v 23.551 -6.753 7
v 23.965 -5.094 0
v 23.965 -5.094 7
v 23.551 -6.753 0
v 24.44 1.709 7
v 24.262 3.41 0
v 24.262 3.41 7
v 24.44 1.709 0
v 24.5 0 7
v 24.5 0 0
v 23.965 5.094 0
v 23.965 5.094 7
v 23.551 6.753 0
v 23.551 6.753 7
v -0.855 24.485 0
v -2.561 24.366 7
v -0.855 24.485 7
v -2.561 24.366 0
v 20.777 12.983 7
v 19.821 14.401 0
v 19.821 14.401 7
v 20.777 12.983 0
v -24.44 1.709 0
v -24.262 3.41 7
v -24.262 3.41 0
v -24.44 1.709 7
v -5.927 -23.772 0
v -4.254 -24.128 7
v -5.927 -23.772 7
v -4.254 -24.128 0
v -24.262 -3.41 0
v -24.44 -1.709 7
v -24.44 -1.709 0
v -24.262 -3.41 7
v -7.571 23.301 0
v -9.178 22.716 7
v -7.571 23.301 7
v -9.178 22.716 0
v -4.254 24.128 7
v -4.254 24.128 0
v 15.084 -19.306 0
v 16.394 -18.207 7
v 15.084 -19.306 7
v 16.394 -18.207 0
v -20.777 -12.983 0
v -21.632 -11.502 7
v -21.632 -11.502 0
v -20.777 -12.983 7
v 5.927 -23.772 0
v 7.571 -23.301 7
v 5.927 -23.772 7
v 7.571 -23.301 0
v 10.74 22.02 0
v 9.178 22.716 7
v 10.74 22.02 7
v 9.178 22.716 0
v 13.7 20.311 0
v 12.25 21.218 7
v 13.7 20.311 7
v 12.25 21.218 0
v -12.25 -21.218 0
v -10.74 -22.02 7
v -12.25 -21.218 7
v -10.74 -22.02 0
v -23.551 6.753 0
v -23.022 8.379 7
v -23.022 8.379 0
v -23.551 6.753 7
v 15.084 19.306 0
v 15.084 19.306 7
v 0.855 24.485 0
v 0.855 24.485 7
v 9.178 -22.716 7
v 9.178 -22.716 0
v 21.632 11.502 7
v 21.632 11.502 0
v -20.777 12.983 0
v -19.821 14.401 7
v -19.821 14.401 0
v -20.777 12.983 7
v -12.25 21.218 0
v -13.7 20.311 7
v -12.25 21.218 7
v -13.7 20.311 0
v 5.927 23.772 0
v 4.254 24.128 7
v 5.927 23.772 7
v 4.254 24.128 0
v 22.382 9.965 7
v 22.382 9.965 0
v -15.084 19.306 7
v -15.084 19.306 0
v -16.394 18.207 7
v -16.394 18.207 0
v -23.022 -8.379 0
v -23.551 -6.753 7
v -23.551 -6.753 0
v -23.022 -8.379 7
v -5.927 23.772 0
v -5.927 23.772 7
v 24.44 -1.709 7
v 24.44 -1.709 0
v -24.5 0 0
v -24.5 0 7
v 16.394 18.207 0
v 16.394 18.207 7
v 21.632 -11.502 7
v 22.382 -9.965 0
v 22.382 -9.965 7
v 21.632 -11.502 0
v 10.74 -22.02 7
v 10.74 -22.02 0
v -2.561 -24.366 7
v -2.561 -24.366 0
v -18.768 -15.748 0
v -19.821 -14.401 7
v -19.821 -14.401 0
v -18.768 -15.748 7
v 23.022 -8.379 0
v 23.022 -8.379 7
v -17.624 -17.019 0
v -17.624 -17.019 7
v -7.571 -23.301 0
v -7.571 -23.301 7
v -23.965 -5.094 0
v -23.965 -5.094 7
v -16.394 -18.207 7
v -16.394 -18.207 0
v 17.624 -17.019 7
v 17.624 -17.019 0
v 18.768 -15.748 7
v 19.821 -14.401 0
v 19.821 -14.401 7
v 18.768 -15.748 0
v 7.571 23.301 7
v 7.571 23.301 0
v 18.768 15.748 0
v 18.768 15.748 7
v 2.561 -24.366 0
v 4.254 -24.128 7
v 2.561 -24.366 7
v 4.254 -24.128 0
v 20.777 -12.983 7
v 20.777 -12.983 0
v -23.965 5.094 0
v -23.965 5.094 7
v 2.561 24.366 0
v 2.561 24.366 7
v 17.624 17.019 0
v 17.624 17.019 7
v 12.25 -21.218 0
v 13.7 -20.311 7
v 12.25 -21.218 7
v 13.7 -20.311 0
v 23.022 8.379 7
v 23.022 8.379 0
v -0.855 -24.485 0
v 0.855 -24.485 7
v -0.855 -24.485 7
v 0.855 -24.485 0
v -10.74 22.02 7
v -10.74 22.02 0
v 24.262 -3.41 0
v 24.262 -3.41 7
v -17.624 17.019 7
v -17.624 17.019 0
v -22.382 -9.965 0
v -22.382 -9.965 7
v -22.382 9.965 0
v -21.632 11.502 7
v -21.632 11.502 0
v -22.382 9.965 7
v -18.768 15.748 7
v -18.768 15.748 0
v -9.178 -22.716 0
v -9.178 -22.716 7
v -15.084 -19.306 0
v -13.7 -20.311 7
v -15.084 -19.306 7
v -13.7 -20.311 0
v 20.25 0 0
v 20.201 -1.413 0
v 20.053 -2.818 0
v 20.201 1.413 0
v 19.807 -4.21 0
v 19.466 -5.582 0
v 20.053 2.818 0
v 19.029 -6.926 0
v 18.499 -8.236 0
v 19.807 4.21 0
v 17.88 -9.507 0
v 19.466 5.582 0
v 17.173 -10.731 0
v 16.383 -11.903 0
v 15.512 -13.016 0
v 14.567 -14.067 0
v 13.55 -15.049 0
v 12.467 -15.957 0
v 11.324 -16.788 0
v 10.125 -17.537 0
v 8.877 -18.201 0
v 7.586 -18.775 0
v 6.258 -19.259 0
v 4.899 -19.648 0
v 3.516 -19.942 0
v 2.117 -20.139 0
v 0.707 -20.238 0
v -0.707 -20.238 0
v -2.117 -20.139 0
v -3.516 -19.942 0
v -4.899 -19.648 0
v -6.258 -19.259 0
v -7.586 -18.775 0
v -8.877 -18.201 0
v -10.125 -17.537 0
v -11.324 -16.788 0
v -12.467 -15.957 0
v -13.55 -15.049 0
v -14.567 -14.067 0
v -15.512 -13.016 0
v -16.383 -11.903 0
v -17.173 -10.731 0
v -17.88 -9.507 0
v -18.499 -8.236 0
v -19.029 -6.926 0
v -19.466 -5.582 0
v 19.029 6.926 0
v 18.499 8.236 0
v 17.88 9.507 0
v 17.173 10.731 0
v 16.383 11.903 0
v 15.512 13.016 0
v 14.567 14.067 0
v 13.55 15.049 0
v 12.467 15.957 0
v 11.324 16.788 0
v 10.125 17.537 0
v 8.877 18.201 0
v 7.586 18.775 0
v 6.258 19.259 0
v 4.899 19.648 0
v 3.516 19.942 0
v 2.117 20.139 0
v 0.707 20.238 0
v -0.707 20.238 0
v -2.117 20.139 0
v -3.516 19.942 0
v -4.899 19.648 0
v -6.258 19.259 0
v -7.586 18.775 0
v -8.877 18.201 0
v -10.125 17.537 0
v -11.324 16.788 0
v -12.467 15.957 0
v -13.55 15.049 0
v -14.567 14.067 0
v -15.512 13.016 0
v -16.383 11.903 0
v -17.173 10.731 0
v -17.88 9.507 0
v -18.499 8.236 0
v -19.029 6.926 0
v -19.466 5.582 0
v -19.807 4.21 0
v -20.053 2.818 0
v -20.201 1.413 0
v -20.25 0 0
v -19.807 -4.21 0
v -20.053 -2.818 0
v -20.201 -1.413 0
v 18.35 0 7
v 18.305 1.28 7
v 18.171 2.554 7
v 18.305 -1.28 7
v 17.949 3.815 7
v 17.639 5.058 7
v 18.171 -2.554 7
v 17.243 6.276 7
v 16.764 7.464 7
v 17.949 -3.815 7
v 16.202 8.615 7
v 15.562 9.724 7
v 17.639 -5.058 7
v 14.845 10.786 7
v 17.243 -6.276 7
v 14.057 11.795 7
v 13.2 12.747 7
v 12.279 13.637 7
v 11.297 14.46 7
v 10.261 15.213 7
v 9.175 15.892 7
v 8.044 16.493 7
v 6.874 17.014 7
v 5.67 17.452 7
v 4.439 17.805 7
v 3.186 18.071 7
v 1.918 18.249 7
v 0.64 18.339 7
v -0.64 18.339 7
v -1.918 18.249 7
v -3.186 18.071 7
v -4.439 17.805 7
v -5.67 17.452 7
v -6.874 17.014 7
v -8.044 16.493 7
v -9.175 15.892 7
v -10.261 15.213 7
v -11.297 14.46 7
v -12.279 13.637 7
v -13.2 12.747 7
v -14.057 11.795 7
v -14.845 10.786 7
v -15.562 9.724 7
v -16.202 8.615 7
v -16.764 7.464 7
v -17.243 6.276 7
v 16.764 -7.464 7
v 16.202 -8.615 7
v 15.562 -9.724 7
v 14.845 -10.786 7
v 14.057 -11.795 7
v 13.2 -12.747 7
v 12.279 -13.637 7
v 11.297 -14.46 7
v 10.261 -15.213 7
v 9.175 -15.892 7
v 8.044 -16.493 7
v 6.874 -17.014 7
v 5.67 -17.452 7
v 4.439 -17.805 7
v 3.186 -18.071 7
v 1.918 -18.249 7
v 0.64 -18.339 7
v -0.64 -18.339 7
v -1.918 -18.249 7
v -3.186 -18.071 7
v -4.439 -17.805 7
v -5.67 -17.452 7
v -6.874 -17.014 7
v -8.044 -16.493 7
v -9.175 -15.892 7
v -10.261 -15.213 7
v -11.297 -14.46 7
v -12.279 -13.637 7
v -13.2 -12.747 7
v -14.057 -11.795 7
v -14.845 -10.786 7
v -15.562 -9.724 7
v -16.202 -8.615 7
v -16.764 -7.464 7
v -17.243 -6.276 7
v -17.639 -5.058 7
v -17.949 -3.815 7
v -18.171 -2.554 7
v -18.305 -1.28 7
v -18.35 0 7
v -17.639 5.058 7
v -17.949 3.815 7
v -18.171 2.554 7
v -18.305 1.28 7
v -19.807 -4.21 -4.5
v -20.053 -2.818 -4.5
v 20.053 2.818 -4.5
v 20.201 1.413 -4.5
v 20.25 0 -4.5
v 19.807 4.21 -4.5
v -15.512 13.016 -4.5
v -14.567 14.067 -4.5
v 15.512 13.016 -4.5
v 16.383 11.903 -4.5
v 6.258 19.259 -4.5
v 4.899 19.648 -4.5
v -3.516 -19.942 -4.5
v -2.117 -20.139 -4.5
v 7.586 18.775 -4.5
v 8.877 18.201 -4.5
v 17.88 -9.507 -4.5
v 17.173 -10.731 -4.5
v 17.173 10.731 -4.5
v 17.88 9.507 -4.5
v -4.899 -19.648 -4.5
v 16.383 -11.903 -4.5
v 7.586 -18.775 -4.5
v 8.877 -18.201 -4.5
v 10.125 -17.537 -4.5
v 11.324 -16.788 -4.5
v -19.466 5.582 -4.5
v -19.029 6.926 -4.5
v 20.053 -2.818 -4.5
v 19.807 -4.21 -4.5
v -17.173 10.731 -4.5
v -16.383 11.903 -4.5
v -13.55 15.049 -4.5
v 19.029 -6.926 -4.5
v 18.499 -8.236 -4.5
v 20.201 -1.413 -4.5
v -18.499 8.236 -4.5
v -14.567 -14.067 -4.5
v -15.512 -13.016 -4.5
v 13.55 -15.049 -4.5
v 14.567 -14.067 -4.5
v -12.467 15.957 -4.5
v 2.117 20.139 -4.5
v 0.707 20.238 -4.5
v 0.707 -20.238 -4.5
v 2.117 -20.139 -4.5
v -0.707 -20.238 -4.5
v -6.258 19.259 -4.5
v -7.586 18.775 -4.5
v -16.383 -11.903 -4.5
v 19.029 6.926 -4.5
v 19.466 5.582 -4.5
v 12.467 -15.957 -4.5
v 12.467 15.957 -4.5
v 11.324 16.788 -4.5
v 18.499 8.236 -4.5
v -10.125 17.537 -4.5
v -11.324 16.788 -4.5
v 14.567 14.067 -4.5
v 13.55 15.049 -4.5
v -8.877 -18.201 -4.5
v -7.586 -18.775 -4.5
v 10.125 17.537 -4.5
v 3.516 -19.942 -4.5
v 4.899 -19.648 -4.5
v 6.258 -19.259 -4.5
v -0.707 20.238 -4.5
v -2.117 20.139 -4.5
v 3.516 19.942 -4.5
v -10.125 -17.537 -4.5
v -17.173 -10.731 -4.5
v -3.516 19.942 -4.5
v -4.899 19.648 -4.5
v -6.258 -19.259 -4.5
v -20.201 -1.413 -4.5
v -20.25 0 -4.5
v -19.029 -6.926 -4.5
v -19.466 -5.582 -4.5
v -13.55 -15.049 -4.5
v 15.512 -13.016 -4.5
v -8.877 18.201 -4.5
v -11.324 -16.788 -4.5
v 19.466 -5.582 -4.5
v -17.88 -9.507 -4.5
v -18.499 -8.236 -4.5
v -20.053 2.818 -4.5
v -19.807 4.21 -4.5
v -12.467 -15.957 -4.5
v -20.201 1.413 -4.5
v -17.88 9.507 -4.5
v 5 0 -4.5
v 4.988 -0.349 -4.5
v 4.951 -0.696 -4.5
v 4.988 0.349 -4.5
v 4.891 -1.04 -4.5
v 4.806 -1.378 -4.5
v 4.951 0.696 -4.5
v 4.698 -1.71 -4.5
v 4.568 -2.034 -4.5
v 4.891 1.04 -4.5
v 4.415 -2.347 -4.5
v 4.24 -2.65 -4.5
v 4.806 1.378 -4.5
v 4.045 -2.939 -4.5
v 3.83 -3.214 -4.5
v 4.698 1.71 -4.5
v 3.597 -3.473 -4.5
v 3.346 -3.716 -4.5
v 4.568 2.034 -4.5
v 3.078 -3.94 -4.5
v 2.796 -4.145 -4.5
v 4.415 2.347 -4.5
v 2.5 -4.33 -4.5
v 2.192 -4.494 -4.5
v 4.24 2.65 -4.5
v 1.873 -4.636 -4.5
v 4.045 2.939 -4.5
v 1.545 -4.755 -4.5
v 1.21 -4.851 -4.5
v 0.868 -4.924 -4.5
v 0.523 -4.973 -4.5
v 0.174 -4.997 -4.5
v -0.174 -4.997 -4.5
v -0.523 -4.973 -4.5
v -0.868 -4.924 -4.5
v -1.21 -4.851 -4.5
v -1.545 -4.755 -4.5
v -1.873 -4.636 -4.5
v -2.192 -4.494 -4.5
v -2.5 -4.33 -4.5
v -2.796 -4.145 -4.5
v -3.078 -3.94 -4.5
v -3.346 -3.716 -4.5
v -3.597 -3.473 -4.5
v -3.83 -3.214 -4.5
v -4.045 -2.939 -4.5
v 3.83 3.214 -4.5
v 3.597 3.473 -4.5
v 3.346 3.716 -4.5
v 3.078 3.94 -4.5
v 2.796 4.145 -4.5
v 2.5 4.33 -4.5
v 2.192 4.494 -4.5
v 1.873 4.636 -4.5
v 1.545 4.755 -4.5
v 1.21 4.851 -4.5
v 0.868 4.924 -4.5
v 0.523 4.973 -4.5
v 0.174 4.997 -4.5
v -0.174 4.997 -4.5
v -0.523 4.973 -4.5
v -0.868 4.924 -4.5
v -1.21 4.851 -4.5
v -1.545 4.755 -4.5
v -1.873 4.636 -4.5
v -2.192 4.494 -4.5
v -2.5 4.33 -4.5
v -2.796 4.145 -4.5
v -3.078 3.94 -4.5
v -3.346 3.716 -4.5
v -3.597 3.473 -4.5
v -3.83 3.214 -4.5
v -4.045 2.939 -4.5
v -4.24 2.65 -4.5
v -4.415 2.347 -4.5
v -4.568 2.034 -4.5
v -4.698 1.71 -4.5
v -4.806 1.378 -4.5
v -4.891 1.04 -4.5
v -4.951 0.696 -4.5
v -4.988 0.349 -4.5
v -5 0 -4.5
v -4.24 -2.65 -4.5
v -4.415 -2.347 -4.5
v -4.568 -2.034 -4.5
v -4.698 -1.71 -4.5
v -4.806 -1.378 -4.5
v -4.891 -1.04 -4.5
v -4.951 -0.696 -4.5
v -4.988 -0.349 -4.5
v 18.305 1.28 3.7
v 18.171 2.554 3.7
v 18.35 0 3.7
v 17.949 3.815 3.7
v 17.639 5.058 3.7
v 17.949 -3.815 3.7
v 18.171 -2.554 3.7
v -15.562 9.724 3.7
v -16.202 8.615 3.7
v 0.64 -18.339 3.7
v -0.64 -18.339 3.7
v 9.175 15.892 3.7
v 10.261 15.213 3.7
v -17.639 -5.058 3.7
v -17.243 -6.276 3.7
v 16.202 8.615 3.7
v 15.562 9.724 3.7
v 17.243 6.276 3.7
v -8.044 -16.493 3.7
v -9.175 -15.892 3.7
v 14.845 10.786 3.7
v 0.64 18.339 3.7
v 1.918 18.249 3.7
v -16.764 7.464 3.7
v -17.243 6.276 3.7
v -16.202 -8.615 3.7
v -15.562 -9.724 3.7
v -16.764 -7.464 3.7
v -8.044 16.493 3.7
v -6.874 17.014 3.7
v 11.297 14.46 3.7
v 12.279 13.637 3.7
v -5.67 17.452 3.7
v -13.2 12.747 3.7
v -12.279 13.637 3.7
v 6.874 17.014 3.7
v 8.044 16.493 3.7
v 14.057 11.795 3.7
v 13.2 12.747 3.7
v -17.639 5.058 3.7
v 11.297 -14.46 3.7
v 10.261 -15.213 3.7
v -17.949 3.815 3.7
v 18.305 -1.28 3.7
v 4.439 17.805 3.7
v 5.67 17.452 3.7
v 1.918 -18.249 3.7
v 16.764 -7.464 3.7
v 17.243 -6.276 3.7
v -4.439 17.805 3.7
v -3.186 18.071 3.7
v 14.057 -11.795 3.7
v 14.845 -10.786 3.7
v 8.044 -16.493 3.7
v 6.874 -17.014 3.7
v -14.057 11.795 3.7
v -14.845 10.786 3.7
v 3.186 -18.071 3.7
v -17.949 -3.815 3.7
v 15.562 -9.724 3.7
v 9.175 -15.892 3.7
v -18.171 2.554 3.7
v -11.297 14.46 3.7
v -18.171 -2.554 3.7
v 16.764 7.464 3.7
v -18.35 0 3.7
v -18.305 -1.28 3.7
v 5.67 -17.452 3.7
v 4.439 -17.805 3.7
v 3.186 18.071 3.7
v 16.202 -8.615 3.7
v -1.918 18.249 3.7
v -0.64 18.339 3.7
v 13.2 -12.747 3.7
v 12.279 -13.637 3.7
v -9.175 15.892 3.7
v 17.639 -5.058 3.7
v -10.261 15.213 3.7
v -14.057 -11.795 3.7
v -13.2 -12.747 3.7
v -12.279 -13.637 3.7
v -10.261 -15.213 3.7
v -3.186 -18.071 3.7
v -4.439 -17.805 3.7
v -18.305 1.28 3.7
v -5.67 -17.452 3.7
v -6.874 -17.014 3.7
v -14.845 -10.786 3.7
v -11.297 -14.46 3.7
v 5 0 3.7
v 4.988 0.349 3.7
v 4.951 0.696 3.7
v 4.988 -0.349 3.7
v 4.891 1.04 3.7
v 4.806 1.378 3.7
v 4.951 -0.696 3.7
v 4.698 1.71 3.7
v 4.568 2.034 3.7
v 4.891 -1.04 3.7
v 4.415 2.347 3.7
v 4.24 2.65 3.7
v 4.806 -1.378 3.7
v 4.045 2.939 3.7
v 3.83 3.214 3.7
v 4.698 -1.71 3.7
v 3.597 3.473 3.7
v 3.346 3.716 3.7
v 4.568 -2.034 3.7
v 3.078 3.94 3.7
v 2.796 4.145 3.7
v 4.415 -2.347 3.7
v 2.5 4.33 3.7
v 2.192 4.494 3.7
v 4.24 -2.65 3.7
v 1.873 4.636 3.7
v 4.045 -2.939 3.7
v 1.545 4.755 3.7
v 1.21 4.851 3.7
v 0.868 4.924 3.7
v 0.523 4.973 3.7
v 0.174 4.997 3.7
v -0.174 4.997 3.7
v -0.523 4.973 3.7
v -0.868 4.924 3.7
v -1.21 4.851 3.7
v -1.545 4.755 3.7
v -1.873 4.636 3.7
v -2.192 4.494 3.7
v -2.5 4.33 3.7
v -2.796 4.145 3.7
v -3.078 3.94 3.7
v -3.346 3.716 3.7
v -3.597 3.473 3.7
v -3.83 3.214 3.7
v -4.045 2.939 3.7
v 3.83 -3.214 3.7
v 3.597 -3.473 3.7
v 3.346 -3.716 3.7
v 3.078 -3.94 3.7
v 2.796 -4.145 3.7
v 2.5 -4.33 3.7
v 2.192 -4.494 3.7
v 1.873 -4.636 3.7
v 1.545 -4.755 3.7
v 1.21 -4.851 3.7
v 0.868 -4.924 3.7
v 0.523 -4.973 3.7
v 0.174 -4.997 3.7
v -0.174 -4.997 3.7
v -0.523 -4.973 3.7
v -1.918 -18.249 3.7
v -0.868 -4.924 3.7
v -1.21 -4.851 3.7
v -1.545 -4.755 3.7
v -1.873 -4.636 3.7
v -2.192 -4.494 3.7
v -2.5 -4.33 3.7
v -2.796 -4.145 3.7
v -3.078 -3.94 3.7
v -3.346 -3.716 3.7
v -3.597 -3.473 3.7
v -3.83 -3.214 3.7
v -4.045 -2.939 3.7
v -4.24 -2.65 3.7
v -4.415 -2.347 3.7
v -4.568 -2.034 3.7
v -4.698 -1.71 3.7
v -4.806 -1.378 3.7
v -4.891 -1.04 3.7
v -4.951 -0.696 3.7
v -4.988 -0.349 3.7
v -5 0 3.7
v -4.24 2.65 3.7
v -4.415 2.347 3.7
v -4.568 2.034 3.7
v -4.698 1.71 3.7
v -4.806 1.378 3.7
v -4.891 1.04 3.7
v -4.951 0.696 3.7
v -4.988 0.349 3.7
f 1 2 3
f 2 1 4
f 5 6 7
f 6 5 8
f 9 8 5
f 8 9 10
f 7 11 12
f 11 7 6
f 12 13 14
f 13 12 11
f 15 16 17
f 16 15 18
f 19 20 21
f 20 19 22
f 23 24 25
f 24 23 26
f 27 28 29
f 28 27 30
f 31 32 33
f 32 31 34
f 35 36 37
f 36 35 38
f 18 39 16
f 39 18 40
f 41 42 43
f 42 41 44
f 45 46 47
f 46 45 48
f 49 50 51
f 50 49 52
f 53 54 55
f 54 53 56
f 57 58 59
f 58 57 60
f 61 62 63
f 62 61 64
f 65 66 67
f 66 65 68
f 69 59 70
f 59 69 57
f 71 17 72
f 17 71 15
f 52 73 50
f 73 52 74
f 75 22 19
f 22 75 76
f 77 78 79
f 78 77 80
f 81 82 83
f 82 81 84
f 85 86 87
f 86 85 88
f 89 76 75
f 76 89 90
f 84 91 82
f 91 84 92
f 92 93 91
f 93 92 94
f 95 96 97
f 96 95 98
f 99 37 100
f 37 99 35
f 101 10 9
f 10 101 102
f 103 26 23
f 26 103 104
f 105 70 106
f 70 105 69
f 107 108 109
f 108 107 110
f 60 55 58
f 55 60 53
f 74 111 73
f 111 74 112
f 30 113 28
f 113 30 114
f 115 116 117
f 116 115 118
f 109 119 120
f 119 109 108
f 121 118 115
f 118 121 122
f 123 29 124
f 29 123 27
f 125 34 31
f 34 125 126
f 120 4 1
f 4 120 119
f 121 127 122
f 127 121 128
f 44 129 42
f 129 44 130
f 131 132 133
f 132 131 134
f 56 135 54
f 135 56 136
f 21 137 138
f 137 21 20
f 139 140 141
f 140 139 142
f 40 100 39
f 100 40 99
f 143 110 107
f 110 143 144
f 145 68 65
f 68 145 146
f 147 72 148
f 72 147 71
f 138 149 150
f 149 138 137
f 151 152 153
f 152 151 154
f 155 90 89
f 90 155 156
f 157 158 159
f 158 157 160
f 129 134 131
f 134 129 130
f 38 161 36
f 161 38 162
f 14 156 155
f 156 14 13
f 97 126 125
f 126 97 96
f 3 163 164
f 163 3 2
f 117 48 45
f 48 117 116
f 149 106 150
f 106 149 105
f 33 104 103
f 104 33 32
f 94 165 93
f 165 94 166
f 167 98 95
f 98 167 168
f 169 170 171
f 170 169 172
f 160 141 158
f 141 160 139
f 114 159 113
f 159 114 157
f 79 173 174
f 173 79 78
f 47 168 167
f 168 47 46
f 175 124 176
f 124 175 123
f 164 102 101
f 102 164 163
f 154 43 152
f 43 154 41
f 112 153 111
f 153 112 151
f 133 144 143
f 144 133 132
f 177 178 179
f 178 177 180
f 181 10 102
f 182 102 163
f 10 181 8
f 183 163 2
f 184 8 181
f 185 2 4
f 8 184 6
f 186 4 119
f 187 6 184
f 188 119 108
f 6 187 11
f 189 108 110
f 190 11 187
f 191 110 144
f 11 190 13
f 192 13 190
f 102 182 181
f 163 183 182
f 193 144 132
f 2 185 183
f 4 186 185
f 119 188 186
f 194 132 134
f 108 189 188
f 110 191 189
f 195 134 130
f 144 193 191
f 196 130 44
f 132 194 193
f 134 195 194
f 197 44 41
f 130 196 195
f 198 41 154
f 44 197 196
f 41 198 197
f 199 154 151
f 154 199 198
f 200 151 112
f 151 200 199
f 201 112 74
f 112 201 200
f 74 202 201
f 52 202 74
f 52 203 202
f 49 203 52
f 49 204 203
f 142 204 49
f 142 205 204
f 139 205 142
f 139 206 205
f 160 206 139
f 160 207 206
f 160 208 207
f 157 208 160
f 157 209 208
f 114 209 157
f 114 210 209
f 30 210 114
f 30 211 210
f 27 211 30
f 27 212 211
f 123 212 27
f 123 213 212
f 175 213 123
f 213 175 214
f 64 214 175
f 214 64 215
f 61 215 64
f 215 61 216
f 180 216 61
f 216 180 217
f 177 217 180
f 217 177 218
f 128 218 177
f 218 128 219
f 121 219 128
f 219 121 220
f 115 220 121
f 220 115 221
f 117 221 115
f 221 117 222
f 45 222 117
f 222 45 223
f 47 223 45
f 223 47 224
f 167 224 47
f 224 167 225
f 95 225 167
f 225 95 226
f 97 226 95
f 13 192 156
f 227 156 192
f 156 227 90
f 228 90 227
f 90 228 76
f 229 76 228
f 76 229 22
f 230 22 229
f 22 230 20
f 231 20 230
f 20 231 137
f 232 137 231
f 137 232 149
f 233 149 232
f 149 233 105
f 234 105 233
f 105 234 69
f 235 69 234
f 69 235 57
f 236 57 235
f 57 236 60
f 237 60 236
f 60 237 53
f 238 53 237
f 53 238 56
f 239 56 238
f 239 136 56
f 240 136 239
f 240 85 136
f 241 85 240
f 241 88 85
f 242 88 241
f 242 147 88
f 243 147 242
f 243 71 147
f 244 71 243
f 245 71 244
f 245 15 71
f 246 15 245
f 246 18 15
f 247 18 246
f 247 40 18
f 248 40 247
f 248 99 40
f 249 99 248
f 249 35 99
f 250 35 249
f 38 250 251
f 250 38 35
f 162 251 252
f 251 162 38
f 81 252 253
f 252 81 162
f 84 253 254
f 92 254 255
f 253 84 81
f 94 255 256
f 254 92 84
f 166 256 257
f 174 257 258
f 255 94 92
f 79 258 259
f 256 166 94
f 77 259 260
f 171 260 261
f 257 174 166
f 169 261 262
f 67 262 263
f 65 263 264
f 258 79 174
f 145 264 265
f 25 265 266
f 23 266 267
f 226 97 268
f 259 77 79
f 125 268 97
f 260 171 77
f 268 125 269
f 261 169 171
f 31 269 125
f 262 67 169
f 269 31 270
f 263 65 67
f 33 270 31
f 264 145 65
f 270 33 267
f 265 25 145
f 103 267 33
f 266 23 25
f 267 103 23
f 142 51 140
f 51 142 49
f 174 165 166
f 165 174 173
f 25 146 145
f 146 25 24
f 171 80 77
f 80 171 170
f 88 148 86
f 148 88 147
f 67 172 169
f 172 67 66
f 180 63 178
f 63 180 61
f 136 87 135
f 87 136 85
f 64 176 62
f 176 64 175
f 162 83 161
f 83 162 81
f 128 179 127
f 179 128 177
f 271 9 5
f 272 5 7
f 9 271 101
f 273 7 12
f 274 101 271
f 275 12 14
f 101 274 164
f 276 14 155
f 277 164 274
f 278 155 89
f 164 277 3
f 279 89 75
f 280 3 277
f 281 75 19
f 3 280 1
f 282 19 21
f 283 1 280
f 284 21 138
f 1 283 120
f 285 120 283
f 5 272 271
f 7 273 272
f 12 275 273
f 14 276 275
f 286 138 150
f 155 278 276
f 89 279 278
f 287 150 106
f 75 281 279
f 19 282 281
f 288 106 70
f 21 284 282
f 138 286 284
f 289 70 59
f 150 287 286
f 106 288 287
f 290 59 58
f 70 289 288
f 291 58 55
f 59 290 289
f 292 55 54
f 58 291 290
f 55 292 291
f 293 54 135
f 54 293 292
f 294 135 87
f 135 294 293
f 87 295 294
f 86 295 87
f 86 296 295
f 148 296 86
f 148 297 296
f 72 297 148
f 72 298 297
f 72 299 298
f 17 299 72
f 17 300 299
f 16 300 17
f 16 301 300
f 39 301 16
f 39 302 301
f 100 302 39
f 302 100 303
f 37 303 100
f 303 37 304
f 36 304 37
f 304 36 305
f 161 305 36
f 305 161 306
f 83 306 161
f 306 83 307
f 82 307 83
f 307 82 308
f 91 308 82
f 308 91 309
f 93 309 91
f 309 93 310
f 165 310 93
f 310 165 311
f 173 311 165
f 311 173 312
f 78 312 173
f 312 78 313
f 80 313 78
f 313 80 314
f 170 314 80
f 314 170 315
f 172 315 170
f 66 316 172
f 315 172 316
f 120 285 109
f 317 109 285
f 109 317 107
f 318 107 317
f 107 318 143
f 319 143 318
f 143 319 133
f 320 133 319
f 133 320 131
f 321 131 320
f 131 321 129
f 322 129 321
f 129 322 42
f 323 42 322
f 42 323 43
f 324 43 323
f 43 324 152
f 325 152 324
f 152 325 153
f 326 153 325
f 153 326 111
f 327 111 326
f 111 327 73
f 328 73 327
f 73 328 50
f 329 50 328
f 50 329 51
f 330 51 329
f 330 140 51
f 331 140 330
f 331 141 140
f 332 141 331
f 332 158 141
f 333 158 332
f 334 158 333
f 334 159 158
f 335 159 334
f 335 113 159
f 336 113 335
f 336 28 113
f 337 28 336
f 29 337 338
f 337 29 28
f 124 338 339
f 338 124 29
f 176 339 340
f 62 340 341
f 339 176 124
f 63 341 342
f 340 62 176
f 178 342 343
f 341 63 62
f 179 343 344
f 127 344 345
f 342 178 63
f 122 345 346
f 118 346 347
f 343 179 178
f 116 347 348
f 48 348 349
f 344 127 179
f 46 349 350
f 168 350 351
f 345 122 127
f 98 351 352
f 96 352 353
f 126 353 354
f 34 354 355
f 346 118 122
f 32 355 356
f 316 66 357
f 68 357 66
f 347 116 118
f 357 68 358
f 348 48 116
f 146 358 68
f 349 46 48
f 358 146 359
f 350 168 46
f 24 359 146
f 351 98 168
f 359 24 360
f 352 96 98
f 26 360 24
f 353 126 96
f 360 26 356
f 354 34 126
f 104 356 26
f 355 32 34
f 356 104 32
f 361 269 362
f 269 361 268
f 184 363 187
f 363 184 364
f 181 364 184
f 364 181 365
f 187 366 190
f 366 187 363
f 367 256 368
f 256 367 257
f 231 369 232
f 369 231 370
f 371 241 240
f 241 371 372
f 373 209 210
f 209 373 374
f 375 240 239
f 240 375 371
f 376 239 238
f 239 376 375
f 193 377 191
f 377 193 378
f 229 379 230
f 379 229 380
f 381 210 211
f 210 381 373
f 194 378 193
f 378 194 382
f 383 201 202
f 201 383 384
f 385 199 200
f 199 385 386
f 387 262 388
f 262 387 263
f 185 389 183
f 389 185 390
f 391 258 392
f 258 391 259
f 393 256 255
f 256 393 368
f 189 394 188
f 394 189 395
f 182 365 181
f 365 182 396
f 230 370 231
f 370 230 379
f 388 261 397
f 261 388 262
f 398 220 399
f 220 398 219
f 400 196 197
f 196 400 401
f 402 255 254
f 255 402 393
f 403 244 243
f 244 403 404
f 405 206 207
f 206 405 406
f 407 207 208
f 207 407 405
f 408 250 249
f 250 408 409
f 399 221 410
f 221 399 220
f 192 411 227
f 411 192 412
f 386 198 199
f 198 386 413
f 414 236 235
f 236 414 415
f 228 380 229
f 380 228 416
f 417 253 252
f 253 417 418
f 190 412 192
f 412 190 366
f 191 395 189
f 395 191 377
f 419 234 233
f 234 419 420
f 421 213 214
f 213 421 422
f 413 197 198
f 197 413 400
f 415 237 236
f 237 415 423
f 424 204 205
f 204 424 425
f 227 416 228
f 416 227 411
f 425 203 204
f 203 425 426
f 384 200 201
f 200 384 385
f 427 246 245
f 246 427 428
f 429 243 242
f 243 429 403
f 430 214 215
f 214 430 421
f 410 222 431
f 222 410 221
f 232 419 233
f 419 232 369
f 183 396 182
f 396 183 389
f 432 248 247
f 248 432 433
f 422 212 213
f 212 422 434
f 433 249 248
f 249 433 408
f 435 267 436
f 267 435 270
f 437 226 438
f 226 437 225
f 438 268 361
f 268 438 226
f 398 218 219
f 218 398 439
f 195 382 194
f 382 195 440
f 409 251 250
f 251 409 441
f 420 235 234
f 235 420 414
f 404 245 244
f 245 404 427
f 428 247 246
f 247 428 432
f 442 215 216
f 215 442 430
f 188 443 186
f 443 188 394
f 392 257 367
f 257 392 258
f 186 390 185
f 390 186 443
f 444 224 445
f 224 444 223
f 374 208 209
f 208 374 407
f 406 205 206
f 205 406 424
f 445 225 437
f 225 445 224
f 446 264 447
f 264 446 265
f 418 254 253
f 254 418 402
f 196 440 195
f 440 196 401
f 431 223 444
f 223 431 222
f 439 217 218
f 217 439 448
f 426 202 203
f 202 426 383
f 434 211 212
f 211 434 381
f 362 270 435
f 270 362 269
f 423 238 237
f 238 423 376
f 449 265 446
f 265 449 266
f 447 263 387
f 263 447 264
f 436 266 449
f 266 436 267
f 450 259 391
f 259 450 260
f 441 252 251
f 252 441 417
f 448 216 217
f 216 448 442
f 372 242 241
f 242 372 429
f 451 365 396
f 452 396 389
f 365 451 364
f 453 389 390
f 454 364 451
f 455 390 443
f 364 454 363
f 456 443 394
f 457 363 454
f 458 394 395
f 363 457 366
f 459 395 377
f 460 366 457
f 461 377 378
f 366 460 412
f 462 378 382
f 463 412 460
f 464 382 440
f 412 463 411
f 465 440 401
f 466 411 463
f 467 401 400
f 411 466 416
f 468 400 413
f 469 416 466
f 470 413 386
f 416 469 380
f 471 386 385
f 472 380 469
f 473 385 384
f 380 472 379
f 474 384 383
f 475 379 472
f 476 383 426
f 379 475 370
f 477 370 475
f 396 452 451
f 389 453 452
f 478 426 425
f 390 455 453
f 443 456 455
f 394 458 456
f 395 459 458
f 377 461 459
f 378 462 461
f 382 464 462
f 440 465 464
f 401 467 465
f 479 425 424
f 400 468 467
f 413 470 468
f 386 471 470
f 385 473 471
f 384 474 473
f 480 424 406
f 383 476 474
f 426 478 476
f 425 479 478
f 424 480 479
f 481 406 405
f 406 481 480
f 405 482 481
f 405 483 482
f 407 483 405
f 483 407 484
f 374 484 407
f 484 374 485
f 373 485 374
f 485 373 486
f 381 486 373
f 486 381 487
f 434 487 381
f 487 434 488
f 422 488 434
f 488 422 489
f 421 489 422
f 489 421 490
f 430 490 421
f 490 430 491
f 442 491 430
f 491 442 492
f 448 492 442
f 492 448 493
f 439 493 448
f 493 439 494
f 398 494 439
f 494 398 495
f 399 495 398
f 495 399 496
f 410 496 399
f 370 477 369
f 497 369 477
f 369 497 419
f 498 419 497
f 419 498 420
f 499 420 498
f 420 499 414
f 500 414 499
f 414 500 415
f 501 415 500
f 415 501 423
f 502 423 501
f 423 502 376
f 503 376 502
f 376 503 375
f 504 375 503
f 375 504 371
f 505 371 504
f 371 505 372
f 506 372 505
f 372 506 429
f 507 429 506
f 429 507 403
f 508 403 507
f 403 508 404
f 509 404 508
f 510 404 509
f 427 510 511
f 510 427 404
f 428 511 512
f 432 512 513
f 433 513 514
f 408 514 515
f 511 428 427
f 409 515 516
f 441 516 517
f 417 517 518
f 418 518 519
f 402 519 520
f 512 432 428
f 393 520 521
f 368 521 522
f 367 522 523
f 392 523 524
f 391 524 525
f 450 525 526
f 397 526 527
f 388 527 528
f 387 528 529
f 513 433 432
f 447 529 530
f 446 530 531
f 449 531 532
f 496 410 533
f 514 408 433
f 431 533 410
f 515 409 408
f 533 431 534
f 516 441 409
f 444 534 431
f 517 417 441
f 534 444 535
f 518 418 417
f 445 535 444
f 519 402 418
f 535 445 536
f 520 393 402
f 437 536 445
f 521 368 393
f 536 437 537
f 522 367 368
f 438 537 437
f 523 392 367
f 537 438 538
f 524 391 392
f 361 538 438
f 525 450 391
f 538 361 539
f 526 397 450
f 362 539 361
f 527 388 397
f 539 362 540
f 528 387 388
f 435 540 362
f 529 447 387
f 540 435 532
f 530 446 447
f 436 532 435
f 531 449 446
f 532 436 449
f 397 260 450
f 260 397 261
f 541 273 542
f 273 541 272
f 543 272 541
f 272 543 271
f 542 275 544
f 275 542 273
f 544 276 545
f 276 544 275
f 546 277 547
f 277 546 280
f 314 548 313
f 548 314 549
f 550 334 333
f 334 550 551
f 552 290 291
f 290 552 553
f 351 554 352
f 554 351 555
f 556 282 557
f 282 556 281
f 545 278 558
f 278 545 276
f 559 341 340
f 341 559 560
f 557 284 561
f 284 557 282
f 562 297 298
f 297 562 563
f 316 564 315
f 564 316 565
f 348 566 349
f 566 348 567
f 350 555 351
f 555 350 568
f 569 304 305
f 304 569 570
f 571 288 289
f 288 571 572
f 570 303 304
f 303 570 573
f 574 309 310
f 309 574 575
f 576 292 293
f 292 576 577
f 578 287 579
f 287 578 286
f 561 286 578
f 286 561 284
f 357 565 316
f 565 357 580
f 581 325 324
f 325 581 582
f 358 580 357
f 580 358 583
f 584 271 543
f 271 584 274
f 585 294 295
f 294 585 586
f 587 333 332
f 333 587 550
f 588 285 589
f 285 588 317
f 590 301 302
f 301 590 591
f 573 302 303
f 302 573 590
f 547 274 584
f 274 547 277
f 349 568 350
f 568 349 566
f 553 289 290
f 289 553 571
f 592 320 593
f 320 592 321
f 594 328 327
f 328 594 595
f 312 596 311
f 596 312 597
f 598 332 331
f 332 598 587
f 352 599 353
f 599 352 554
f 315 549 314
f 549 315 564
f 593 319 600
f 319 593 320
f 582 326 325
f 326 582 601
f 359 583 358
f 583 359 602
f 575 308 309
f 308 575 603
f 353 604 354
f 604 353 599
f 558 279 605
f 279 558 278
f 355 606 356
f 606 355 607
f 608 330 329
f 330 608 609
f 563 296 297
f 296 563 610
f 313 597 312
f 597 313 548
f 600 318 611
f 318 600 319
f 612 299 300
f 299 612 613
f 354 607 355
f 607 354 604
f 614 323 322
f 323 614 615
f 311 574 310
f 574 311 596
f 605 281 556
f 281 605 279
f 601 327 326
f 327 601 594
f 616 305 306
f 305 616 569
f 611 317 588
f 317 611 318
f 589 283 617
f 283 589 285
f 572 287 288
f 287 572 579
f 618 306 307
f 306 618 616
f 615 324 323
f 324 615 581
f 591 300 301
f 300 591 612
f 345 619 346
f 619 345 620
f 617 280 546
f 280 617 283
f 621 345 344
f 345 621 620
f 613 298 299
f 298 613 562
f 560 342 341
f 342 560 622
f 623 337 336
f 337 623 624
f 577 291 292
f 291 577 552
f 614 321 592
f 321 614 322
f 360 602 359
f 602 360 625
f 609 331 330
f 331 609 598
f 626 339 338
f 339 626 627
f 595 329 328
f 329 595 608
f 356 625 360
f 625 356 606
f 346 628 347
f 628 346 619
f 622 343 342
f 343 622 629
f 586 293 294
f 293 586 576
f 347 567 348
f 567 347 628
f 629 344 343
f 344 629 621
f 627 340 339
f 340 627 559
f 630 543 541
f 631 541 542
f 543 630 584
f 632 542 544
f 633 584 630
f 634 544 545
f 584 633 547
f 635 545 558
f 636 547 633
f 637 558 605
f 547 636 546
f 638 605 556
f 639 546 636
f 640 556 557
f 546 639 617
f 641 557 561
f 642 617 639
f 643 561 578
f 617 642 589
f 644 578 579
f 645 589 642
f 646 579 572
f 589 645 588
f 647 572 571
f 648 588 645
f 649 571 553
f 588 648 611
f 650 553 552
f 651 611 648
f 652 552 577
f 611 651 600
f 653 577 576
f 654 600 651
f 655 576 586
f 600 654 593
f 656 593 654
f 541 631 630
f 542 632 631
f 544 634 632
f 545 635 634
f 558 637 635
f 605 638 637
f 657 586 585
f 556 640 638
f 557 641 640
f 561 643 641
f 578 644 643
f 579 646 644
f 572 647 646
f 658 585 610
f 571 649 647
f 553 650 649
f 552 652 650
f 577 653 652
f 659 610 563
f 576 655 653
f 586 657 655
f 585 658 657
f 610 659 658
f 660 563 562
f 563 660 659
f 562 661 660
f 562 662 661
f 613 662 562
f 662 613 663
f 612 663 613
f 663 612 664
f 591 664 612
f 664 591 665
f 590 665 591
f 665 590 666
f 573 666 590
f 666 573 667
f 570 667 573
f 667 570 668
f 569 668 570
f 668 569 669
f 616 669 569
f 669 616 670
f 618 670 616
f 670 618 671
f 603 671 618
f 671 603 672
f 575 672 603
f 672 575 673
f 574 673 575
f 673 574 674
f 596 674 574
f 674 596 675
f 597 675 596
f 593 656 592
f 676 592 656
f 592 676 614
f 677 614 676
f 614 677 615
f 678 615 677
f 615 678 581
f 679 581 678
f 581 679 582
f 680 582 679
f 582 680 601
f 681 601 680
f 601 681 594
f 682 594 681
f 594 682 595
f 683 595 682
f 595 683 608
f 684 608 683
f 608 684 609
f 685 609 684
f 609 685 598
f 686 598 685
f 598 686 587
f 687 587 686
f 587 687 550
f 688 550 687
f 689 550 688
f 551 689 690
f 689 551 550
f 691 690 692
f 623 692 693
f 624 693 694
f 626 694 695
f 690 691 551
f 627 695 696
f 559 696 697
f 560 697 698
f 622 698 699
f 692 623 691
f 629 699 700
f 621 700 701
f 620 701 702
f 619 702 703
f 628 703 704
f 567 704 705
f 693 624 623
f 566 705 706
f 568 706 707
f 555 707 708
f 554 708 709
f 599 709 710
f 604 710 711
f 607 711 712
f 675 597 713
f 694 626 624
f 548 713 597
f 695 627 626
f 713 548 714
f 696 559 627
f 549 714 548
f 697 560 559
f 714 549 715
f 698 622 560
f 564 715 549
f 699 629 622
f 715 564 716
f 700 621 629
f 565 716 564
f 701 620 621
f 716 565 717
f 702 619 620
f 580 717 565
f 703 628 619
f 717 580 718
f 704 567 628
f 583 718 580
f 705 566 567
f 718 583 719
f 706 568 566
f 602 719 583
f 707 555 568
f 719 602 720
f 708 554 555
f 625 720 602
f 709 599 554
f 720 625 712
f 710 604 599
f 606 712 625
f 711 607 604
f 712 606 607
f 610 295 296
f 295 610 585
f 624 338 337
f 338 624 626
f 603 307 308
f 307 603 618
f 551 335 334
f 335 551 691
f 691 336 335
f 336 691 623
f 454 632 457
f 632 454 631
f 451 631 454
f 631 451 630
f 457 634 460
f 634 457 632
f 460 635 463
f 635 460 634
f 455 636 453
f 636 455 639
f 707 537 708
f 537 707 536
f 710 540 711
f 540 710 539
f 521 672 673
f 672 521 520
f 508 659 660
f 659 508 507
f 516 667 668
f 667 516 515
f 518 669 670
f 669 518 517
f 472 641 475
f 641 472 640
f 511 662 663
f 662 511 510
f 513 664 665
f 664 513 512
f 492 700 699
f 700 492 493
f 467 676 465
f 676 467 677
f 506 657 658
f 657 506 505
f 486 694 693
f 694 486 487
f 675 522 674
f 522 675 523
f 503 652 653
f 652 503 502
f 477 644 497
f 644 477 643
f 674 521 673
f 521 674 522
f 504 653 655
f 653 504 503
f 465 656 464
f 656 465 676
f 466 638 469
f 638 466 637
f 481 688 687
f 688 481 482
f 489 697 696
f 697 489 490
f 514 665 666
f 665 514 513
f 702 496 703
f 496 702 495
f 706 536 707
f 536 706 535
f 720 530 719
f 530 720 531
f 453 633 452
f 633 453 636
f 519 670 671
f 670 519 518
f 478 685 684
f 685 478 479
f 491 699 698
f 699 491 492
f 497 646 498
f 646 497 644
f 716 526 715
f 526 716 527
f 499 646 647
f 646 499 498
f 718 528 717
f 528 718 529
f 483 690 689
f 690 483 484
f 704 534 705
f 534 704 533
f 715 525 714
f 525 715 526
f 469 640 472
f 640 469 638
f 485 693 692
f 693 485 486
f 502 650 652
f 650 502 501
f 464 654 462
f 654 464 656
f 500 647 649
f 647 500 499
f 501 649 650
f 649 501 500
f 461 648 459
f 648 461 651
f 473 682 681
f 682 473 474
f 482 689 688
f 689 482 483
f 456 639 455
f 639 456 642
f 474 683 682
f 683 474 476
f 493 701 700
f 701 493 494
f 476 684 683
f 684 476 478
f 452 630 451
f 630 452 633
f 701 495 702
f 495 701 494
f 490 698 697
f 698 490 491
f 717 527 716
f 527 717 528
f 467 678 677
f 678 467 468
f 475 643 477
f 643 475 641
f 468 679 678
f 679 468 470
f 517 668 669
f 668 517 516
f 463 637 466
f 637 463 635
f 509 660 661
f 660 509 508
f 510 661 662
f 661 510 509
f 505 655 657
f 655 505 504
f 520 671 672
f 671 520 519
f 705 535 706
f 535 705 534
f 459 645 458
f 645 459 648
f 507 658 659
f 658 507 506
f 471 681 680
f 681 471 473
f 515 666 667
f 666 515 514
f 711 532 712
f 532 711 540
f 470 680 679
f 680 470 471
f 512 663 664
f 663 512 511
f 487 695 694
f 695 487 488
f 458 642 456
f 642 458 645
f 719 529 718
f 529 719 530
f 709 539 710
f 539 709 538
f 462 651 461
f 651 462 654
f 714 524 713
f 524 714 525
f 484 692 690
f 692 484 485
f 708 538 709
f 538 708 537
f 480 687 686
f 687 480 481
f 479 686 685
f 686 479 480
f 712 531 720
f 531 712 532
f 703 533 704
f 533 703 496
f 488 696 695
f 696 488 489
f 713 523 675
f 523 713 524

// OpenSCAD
$fn = 90;

tube();
!pf_outer();
pf_bearing();

module tube() {
    difference() {
        cylinder(d = 16, h = 80);
        translate([0, 0, -1]) cylinder(d = 10, h = 82);
    }
}

// Adapter for frame
module pf_outer() {
    difference() {
        translate([0, 0, 0]) {
            cylinder(d = 49, h = 7);
            translate([0, 0, -4.5]) cylinder(d = 40.5, h = 5);
        }
        translate([0, 0, 3.7]) cylinder(d = 36.7, h = 3.4);
        translate([0, 0, -10]) cylinder(d = 10, h = 20);
    }
}

// Adapter for bearing
module pf_bearing() {
    difference() {
        translate([0, 0, 0]) {
            cylinder(d = 44, h = 7);
            translate([0, 0, -6.5]) cylinder(d = 28.5, h = 7);
        }
        translate([0, 0, 4.1]) cylinder(d = 33.3, h = 3);
        translate([0, 0, -10]) cylinder(d = 10, h = 20);
    }
}
